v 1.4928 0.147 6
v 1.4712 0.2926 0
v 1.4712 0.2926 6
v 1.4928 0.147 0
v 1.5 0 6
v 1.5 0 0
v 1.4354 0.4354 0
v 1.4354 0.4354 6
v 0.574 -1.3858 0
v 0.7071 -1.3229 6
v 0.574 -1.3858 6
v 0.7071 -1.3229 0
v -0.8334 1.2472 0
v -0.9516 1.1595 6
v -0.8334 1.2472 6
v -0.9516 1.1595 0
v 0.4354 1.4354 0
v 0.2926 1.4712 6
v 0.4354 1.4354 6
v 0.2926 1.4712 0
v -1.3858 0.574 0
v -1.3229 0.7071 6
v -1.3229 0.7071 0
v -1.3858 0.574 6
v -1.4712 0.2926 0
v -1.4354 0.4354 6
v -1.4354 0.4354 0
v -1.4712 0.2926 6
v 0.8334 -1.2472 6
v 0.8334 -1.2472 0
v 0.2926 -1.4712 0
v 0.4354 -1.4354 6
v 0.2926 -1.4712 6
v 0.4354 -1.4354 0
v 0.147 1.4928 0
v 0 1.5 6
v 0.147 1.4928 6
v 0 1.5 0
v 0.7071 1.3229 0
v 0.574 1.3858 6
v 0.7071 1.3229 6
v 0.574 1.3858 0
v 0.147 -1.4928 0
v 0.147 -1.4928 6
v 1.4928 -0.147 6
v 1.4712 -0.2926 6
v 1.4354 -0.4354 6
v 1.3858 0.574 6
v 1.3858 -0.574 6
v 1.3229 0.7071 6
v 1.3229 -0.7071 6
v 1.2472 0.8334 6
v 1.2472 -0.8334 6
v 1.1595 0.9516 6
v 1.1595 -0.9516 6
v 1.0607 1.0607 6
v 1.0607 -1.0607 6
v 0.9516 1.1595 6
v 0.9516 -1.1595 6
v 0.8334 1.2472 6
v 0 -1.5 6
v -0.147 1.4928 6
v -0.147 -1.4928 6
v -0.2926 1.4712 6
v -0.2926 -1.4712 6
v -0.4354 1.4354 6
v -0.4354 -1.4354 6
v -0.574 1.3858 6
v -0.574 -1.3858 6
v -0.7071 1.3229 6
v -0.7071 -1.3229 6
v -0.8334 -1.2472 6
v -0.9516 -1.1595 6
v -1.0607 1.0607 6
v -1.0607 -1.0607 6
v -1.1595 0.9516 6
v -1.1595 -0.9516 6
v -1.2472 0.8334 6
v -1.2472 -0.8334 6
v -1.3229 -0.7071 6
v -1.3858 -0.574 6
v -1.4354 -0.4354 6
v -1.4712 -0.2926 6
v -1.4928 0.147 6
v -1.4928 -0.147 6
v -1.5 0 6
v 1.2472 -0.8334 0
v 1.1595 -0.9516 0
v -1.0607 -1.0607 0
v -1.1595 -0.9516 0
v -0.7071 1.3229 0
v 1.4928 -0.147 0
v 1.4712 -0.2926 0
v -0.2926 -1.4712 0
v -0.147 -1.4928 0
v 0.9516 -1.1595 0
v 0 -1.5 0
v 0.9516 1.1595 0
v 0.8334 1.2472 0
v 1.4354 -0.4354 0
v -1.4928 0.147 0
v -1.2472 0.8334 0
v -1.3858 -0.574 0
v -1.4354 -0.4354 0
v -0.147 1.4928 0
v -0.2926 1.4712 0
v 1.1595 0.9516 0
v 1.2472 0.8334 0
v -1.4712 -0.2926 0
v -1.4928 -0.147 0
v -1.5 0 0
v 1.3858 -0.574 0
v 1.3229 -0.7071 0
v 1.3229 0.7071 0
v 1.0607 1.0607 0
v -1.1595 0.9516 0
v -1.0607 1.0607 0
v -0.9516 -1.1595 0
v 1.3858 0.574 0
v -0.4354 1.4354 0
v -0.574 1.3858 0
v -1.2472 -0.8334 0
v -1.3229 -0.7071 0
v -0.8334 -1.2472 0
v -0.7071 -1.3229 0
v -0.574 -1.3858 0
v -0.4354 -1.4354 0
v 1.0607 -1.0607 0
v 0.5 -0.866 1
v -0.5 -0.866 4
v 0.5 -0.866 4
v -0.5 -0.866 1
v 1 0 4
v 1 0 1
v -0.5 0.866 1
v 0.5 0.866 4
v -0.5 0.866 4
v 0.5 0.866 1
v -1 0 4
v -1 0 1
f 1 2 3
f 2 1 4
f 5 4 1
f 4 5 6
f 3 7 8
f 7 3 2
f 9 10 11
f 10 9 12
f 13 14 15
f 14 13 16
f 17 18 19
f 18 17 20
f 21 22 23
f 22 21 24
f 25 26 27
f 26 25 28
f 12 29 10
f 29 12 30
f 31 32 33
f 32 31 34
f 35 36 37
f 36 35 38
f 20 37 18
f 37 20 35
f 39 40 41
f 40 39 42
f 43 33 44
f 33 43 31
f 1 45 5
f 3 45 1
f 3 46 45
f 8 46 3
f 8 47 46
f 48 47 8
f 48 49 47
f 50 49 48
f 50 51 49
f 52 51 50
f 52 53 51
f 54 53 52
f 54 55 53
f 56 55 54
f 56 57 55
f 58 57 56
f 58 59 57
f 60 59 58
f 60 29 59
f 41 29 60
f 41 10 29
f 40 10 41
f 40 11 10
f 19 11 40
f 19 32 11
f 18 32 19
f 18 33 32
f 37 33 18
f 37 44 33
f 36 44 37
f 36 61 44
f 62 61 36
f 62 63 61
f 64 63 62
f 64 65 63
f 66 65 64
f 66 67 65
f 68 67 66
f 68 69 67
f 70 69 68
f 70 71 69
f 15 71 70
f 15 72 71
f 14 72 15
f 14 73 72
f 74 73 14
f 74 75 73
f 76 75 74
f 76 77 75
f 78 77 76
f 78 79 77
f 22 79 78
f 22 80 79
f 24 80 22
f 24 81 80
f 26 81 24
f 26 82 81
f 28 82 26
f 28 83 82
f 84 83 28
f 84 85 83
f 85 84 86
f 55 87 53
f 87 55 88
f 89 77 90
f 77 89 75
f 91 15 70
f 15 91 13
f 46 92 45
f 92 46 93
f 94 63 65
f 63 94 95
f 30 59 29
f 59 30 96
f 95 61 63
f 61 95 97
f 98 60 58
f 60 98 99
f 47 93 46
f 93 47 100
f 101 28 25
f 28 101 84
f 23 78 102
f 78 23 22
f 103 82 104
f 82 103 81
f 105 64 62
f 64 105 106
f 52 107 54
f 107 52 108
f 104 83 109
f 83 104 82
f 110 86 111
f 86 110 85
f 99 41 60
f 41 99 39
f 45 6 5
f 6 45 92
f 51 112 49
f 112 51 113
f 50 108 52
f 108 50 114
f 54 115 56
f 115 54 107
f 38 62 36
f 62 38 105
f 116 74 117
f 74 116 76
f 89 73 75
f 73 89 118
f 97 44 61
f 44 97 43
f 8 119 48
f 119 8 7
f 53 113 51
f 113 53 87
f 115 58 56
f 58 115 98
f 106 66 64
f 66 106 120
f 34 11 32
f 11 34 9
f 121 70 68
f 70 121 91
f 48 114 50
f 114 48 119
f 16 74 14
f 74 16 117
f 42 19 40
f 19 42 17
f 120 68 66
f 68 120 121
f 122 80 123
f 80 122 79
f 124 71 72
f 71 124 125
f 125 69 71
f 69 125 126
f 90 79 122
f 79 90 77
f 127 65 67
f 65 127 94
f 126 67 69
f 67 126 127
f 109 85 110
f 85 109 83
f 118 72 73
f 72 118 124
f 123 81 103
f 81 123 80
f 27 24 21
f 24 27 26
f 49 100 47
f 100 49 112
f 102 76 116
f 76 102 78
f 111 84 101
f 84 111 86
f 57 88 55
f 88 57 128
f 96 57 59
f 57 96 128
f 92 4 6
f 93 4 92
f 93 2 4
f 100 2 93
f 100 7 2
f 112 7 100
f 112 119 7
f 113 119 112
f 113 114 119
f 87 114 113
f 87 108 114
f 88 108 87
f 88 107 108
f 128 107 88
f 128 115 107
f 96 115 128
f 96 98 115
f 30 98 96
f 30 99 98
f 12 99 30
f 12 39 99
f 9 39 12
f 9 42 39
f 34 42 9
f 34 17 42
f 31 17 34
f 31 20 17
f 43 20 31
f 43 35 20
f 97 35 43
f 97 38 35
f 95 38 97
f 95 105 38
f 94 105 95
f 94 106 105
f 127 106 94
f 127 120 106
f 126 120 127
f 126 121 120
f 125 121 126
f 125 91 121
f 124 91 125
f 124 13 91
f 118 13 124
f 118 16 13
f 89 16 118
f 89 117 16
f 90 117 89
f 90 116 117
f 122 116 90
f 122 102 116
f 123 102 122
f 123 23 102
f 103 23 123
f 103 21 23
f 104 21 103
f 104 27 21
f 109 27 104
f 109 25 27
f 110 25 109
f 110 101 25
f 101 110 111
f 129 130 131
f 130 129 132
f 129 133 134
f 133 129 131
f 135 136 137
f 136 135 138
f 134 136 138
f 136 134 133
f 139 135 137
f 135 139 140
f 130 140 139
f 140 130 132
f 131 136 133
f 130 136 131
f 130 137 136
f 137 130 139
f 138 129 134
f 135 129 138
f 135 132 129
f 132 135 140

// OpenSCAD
module grub_screw() {
    difference() {
        // Main body of the screw
        cylinder(h=6, d=3, $fn=64);
        
        // Hex socket
        translate([0, 0, 1])
            cylinder(h=3, d=2, $fn=6);
    }
}

grub_screw();
